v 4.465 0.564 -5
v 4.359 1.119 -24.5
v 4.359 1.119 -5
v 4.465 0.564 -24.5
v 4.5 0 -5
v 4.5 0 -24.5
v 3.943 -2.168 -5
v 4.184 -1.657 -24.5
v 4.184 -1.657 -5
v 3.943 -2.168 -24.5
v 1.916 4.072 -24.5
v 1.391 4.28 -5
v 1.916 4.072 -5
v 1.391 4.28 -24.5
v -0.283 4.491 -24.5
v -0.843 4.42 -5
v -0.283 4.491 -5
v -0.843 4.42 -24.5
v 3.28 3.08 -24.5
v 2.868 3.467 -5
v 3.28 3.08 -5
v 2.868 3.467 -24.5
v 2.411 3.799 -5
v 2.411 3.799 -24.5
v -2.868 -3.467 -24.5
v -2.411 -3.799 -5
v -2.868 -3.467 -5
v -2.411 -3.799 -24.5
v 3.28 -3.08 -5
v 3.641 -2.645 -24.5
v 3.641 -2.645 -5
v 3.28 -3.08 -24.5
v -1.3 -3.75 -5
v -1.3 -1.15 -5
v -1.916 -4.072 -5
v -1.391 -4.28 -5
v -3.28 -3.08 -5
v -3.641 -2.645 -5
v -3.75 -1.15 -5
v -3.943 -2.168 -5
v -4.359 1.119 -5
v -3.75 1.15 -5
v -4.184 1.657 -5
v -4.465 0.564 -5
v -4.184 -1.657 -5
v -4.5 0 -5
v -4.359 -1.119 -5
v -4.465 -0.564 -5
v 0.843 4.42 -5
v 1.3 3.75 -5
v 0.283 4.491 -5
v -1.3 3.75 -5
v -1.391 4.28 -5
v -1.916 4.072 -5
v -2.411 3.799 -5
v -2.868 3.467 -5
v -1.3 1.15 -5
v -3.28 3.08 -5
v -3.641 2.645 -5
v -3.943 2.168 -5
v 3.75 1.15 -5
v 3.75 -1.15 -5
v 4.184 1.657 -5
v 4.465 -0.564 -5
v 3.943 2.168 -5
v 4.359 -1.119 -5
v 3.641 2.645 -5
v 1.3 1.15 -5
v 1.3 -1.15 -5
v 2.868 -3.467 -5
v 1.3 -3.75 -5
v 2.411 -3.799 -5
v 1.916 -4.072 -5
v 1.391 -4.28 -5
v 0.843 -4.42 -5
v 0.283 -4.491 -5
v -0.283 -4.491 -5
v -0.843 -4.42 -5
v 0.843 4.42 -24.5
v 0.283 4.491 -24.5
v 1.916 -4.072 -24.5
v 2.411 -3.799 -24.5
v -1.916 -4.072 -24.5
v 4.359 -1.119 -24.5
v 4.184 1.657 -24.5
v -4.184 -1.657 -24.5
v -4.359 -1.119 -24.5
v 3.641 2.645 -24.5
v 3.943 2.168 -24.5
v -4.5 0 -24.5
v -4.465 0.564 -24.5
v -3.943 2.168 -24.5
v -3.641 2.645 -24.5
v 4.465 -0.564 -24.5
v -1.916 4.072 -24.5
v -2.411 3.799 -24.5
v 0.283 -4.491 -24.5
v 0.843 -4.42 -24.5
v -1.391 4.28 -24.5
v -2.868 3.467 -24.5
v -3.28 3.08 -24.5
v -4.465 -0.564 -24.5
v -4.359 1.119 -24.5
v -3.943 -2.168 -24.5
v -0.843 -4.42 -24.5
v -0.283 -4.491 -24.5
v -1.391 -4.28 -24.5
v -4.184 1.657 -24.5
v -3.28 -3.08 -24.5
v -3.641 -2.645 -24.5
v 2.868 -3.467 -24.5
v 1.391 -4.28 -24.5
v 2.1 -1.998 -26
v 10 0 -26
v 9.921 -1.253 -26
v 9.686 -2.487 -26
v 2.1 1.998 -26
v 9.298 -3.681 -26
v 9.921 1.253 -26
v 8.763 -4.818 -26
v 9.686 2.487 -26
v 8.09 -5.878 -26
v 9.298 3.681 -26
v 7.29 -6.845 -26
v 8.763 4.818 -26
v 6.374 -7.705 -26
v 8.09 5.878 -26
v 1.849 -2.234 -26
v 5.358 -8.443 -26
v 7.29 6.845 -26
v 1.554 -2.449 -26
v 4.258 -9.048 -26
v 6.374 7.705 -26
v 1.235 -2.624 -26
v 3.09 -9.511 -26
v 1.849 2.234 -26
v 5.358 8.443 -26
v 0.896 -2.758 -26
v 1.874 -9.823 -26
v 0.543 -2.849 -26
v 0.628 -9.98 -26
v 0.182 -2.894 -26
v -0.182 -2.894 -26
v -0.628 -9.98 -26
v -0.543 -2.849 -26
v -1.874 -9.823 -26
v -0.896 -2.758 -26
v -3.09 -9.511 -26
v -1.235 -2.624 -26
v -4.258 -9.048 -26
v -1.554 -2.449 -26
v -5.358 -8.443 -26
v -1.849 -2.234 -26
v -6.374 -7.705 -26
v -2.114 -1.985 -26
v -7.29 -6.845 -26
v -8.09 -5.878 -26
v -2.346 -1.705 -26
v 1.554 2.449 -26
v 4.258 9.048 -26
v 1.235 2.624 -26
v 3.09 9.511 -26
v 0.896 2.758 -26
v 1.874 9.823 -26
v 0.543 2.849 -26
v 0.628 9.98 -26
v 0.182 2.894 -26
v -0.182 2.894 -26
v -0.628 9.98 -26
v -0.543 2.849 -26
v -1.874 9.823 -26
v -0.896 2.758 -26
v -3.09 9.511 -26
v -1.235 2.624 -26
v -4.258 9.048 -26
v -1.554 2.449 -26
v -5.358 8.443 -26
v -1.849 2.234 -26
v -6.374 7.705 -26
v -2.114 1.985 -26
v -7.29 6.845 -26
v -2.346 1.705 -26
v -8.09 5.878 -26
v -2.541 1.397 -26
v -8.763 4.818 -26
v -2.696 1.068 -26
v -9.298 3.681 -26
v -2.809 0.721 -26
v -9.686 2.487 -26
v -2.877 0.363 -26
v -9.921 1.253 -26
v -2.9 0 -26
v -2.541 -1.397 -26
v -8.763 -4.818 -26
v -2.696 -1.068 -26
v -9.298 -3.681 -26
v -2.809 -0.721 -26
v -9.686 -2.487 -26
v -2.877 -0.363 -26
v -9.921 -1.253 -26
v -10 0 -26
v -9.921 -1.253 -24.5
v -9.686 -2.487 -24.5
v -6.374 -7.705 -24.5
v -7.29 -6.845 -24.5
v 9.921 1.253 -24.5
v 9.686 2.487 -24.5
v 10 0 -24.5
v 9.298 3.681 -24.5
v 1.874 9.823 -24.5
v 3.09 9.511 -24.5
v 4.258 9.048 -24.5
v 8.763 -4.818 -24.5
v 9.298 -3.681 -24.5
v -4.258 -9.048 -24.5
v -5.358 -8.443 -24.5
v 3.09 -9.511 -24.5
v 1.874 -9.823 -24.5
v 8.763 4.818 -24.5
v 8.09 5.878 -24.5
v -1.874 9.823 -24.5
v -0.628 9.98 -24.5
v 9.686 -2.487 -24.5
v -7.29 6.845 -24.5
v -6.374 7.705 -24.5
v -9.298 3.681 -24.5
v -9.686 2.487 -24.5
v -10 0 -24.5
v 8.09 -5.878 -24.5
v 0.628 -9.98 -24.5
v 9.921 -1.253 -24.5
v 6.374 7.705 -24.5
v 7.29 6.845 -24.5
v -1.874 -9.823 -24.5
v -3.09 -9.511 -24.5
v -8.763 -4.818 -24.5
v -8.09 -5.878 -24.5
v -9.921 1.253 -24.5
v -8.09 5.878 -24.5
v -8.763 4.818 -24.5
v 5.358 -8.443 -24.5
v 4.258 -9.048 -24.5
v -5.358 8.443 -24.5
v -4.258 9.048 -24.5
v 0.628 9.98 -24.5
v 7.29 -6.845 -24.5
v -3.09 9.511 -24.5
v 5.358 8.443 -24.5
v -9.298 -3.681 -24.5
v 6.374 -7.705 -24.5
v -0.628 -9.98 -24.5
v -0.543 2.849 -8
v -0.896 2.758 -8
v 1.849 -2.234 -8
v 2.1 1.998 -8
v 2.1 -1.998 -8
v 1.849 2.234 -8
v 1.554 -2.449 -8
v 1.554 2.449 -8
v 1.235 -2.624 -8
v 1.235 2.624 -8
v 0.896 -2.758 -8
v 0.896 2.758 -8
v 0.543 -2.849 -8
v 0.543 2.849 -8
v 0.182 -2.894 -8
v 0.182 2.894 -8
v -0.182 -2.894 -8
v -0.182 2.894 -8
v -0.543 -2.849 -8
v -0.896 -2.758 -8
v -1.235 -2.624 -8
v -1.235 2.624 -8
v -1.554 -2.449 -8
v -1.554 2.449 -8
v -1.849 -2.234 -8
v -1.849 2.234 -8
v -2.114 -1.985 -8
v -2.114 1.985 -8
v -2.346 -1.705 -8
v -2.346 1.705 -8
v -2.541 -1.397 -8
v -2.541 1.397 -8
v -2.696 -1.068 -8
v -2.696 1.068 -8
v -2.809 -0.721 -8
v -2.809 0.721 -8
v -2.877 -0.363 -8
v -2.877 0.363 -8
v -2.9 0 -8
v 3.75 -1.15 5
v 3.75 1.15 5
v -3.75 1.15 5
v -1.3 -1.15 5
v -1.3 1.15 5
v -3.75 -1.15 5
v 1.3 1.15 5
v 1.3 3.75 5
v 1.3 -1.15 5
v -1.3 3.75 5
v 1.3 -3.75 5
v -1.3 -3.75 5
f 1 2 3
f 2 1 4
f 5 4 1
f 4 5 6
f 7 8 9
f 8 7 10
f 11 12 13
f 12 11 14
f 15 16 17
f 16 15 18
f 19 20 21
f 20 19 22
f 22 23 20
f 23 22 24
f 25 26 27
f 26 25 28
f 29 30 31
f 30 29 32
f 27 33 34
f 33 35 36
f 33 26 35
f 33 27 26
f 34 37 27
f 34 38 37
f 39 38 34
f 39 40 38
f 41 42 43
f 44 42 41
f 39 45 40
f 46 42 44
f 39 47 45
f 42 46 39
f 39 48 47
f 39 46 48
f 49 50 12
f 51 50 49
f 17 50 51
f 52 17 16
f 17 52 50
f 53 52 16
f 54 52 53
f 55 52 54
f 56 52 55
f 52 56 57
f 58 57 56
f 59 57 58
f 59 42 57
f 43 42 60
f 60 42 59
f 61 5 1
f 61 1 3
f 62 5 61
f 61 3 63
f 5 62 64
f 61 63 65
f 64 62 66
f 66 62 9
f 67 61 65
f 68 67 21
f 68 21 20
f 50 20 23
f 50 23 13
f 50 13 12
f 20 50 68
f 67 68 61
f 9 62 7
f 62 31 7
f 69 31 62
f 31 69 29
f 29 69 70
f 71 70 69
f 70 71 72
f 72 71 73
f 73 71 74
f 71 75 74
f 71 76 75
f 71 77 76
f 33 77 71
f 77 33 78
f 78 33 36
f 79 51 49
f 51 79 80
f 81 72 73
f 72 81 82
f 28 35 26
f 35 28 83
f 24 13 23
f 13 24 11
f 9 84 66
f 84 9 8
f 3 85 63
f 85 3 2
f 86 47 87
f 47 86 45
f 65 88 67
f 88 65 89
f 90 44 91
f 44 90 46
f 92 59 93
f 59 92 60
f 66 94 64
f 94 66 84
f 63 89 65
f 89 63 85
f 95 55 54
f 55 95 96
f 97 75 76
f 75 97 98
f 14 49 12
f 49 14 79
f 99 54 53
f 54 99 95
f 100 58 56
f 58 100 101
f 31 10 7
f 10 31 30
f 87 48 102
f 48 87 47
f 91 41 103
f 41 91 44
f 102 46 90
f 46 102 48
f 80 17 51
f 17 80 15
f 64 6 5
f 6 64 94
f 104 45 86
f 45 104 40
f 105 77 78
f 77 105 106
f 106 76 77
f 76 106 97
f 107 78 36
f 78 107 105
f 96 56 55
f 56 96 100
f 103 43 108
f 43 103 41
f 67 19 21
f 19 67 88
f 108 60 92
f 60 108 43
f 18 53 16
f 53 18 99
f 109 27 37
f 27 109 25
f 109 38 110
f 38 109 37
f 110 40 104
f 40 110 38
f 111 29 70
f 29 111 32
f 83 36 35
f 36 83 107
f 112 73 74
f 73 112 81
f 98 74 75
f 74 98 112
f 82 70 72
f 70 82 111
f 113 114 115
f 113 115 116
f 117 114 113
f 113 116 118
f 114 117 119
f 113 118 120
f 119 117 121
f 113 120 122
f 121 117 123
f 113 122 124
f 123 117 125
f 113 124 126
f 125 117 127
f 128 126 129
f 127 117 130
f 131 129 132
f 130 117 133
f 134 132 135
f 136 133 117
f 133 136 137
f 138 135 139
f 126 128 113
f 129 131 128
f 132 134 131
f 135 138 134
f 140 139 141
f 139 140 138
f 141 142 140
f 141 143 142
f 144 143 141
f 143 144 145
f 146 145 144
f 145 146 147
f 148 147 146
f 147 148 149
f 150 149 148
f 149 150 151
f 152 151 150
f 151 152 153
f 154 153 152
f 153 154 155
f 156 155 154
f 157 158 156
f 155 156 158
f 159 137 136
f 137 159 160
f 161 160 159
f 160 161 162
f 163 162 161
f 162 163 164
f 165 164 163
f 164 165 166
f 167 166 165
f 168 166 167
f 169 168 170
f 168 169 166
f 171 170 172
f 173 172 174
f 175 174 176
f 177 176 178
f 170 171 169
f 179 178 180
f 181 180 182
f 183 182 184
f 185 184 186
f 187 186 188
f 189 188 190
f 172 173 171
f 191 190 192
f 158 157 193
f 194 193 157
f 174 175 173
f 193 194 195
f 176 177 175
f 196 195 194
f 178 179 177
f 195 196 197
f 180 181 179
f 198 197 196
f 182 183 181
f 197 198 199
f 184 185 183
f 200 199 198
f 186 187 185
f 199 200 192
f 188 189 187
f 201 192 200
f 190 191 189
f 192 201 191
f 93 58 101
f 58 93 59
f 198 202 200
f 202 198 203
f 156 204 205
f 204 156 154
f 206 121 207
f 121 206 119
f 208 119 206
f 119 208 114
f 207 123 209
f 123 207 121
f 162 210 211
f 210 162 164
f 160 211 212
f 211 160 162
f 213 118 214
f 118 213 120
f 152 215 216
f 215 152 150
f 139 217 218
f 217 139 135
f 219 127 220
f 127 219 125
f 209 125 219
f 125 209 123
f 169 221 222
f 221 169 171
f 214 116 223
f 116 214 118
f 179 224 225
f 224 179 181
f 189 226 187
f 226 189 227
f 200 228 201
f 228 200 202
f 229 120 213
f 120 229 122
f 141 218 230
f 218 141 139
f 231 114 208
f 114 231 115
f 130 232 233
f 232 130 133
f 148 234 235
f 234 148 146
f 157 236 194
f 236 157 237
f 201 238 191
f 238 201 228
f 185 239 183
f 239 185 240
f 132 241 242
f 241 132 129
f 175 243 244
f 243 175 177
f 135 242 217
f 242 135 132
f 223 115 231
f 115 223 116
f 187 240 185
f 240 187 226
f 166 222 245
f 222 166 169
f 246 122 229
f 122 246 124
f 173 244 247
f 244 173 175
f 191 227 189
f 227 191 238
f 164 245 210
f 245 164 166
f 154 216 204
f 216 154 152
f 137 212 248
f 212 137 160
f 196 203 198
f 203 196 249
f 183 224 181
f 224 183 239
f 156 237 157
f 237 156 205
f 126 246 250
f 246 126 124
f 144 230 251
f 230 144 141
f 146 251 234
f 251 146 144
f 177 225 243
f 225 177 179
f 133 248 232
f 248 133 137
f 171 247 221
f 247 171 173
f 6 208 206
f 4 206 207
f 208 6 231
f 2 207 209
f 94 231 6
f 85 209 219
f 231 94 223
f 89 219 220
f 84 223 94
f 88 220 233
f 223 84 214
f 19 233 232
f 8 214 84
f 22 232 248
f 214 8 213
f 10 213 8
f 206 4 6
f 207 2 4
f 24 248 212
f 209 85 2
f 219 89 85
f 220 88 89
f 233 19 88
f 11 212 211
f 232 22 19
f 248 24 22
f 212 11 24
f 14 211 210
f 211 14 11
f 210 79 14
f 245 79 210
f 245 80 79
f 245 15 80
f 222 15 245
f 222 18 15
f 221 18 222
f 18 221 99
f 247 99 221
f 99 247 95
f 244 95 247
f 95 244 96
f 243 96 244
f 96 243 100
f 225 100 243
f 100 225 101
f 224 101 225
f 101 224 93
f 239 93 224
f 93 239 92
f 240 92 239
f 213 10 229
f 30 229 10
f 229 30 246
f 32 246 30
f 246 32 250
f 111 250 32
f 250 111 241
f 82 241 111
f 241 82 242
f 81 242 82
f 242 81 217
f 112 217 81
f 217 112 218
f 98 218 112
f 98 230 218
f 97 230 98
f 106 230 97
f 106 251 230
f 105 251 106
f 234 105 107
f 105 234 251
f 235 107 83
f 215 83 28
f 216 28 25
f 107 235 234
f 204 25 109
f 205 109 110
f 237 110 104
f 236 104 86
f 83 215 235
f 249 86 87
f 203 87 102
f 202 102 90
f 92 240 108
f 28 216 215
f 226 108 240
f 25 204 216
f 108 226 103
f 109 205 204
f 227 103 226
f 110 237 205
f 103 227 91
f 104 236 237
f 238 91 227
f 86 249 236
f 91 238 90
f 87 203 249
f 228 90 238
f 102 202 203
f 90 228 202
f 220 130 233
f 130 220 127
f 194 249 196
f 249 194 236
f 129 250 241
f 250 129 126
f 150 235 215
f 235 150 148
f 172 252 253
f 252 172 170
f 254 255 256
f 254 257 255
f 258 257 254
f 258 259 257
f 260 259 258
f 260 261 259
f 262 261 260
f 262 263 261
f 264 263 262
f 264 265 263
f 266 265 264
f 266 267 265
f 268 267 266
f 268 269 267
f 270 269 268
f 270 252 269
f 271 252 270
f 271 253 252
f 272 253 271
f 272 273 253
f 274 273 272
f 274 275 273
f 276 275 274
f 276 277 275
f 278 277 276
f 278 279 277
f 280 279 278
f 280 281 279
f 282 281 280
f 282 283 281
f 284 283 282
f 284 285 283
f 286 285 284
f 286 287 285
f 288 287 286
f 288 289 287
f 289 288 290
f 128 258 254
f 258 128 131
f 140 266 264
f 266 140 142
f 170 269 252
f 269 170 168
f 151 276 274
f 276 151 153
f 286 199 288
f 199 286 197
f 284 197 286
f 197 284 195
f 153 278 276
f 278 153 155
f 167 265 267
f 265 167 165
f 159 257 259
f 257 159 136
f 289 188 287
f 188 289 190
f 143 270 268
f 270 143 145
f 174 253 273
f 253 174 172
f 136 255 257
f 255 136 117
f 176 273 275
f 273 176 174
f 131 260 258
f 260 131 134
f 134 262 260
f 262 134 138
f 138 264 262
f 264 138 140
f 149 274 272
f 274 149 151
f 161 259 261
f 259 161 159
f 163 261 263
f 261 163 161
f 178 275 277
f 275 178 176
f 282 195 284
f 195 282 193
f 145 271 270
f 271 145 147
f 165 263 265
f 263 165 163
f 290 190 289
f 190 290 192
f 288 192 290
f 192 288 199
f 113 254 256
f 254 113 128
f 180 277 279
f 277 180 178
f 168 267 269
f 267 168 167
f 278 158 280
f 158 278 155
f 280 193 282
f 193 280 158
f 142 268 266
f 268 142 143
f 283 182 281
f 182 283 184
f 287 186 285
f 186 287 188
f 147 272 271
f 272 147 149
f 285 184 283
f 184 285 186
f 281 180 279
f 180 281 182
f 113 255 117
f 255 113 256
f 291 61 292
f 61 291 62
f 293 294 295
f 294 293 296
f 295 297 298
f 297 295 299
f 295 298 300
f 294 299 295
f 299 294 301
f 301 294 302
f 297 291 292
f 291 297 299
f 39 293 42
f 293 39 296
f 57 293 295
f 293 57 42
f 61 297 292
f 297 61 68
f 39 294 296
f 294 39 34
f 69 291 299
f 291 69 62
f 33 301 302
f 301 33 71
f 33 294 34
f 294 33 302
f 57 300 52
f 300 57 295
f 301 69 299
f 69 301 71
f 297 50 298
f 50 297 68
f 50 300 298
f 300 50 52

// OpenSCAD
height = 10;
box_width = 7.5;
box_height = 2.3;
box2_height = 2.6;

socket_height = 21;
socket_radius = 4.5;

base_radius = 10;
base_height = 1.5;

facets = 50;

socket();
shaft();

module socket()
{
	difference()
	{
		union()
		{
			translate([0, 0, -((height / 2) + (socket_height / 2))]) 
				cylinder(h = socket_height, r1 = socket_radius, r2 = socket_radius, center=true, $fn=facets);
			translate([0, 0, -((height / 2) + socket_height - (base_height / 2))])
				cylinder(h = base_height, r1 = base_radius, r2 = base_radius, center=true, $fn=facets);
		}
		translate([0,0,-3])
			difference()
			{
				color([1,0,0])
					translate([0, 0, -(((height / 2) + (socket_height / 2)))])
						cylinder (h=socket_height,r=socket_radius-1.6, center=true,$fn=facets );
				color([0,0,1])
					translate([4.6, 0, -((height / 2) + (socket_height / 2))])
						cube ([5,5,socket_height], center=true);
			}
	}
}

module shaft()
{
	cube([box_width, box_height, height], center=true);
    rotate(90, 0, 0)
		cube([box_width, box2_height, height], center=true);
}
